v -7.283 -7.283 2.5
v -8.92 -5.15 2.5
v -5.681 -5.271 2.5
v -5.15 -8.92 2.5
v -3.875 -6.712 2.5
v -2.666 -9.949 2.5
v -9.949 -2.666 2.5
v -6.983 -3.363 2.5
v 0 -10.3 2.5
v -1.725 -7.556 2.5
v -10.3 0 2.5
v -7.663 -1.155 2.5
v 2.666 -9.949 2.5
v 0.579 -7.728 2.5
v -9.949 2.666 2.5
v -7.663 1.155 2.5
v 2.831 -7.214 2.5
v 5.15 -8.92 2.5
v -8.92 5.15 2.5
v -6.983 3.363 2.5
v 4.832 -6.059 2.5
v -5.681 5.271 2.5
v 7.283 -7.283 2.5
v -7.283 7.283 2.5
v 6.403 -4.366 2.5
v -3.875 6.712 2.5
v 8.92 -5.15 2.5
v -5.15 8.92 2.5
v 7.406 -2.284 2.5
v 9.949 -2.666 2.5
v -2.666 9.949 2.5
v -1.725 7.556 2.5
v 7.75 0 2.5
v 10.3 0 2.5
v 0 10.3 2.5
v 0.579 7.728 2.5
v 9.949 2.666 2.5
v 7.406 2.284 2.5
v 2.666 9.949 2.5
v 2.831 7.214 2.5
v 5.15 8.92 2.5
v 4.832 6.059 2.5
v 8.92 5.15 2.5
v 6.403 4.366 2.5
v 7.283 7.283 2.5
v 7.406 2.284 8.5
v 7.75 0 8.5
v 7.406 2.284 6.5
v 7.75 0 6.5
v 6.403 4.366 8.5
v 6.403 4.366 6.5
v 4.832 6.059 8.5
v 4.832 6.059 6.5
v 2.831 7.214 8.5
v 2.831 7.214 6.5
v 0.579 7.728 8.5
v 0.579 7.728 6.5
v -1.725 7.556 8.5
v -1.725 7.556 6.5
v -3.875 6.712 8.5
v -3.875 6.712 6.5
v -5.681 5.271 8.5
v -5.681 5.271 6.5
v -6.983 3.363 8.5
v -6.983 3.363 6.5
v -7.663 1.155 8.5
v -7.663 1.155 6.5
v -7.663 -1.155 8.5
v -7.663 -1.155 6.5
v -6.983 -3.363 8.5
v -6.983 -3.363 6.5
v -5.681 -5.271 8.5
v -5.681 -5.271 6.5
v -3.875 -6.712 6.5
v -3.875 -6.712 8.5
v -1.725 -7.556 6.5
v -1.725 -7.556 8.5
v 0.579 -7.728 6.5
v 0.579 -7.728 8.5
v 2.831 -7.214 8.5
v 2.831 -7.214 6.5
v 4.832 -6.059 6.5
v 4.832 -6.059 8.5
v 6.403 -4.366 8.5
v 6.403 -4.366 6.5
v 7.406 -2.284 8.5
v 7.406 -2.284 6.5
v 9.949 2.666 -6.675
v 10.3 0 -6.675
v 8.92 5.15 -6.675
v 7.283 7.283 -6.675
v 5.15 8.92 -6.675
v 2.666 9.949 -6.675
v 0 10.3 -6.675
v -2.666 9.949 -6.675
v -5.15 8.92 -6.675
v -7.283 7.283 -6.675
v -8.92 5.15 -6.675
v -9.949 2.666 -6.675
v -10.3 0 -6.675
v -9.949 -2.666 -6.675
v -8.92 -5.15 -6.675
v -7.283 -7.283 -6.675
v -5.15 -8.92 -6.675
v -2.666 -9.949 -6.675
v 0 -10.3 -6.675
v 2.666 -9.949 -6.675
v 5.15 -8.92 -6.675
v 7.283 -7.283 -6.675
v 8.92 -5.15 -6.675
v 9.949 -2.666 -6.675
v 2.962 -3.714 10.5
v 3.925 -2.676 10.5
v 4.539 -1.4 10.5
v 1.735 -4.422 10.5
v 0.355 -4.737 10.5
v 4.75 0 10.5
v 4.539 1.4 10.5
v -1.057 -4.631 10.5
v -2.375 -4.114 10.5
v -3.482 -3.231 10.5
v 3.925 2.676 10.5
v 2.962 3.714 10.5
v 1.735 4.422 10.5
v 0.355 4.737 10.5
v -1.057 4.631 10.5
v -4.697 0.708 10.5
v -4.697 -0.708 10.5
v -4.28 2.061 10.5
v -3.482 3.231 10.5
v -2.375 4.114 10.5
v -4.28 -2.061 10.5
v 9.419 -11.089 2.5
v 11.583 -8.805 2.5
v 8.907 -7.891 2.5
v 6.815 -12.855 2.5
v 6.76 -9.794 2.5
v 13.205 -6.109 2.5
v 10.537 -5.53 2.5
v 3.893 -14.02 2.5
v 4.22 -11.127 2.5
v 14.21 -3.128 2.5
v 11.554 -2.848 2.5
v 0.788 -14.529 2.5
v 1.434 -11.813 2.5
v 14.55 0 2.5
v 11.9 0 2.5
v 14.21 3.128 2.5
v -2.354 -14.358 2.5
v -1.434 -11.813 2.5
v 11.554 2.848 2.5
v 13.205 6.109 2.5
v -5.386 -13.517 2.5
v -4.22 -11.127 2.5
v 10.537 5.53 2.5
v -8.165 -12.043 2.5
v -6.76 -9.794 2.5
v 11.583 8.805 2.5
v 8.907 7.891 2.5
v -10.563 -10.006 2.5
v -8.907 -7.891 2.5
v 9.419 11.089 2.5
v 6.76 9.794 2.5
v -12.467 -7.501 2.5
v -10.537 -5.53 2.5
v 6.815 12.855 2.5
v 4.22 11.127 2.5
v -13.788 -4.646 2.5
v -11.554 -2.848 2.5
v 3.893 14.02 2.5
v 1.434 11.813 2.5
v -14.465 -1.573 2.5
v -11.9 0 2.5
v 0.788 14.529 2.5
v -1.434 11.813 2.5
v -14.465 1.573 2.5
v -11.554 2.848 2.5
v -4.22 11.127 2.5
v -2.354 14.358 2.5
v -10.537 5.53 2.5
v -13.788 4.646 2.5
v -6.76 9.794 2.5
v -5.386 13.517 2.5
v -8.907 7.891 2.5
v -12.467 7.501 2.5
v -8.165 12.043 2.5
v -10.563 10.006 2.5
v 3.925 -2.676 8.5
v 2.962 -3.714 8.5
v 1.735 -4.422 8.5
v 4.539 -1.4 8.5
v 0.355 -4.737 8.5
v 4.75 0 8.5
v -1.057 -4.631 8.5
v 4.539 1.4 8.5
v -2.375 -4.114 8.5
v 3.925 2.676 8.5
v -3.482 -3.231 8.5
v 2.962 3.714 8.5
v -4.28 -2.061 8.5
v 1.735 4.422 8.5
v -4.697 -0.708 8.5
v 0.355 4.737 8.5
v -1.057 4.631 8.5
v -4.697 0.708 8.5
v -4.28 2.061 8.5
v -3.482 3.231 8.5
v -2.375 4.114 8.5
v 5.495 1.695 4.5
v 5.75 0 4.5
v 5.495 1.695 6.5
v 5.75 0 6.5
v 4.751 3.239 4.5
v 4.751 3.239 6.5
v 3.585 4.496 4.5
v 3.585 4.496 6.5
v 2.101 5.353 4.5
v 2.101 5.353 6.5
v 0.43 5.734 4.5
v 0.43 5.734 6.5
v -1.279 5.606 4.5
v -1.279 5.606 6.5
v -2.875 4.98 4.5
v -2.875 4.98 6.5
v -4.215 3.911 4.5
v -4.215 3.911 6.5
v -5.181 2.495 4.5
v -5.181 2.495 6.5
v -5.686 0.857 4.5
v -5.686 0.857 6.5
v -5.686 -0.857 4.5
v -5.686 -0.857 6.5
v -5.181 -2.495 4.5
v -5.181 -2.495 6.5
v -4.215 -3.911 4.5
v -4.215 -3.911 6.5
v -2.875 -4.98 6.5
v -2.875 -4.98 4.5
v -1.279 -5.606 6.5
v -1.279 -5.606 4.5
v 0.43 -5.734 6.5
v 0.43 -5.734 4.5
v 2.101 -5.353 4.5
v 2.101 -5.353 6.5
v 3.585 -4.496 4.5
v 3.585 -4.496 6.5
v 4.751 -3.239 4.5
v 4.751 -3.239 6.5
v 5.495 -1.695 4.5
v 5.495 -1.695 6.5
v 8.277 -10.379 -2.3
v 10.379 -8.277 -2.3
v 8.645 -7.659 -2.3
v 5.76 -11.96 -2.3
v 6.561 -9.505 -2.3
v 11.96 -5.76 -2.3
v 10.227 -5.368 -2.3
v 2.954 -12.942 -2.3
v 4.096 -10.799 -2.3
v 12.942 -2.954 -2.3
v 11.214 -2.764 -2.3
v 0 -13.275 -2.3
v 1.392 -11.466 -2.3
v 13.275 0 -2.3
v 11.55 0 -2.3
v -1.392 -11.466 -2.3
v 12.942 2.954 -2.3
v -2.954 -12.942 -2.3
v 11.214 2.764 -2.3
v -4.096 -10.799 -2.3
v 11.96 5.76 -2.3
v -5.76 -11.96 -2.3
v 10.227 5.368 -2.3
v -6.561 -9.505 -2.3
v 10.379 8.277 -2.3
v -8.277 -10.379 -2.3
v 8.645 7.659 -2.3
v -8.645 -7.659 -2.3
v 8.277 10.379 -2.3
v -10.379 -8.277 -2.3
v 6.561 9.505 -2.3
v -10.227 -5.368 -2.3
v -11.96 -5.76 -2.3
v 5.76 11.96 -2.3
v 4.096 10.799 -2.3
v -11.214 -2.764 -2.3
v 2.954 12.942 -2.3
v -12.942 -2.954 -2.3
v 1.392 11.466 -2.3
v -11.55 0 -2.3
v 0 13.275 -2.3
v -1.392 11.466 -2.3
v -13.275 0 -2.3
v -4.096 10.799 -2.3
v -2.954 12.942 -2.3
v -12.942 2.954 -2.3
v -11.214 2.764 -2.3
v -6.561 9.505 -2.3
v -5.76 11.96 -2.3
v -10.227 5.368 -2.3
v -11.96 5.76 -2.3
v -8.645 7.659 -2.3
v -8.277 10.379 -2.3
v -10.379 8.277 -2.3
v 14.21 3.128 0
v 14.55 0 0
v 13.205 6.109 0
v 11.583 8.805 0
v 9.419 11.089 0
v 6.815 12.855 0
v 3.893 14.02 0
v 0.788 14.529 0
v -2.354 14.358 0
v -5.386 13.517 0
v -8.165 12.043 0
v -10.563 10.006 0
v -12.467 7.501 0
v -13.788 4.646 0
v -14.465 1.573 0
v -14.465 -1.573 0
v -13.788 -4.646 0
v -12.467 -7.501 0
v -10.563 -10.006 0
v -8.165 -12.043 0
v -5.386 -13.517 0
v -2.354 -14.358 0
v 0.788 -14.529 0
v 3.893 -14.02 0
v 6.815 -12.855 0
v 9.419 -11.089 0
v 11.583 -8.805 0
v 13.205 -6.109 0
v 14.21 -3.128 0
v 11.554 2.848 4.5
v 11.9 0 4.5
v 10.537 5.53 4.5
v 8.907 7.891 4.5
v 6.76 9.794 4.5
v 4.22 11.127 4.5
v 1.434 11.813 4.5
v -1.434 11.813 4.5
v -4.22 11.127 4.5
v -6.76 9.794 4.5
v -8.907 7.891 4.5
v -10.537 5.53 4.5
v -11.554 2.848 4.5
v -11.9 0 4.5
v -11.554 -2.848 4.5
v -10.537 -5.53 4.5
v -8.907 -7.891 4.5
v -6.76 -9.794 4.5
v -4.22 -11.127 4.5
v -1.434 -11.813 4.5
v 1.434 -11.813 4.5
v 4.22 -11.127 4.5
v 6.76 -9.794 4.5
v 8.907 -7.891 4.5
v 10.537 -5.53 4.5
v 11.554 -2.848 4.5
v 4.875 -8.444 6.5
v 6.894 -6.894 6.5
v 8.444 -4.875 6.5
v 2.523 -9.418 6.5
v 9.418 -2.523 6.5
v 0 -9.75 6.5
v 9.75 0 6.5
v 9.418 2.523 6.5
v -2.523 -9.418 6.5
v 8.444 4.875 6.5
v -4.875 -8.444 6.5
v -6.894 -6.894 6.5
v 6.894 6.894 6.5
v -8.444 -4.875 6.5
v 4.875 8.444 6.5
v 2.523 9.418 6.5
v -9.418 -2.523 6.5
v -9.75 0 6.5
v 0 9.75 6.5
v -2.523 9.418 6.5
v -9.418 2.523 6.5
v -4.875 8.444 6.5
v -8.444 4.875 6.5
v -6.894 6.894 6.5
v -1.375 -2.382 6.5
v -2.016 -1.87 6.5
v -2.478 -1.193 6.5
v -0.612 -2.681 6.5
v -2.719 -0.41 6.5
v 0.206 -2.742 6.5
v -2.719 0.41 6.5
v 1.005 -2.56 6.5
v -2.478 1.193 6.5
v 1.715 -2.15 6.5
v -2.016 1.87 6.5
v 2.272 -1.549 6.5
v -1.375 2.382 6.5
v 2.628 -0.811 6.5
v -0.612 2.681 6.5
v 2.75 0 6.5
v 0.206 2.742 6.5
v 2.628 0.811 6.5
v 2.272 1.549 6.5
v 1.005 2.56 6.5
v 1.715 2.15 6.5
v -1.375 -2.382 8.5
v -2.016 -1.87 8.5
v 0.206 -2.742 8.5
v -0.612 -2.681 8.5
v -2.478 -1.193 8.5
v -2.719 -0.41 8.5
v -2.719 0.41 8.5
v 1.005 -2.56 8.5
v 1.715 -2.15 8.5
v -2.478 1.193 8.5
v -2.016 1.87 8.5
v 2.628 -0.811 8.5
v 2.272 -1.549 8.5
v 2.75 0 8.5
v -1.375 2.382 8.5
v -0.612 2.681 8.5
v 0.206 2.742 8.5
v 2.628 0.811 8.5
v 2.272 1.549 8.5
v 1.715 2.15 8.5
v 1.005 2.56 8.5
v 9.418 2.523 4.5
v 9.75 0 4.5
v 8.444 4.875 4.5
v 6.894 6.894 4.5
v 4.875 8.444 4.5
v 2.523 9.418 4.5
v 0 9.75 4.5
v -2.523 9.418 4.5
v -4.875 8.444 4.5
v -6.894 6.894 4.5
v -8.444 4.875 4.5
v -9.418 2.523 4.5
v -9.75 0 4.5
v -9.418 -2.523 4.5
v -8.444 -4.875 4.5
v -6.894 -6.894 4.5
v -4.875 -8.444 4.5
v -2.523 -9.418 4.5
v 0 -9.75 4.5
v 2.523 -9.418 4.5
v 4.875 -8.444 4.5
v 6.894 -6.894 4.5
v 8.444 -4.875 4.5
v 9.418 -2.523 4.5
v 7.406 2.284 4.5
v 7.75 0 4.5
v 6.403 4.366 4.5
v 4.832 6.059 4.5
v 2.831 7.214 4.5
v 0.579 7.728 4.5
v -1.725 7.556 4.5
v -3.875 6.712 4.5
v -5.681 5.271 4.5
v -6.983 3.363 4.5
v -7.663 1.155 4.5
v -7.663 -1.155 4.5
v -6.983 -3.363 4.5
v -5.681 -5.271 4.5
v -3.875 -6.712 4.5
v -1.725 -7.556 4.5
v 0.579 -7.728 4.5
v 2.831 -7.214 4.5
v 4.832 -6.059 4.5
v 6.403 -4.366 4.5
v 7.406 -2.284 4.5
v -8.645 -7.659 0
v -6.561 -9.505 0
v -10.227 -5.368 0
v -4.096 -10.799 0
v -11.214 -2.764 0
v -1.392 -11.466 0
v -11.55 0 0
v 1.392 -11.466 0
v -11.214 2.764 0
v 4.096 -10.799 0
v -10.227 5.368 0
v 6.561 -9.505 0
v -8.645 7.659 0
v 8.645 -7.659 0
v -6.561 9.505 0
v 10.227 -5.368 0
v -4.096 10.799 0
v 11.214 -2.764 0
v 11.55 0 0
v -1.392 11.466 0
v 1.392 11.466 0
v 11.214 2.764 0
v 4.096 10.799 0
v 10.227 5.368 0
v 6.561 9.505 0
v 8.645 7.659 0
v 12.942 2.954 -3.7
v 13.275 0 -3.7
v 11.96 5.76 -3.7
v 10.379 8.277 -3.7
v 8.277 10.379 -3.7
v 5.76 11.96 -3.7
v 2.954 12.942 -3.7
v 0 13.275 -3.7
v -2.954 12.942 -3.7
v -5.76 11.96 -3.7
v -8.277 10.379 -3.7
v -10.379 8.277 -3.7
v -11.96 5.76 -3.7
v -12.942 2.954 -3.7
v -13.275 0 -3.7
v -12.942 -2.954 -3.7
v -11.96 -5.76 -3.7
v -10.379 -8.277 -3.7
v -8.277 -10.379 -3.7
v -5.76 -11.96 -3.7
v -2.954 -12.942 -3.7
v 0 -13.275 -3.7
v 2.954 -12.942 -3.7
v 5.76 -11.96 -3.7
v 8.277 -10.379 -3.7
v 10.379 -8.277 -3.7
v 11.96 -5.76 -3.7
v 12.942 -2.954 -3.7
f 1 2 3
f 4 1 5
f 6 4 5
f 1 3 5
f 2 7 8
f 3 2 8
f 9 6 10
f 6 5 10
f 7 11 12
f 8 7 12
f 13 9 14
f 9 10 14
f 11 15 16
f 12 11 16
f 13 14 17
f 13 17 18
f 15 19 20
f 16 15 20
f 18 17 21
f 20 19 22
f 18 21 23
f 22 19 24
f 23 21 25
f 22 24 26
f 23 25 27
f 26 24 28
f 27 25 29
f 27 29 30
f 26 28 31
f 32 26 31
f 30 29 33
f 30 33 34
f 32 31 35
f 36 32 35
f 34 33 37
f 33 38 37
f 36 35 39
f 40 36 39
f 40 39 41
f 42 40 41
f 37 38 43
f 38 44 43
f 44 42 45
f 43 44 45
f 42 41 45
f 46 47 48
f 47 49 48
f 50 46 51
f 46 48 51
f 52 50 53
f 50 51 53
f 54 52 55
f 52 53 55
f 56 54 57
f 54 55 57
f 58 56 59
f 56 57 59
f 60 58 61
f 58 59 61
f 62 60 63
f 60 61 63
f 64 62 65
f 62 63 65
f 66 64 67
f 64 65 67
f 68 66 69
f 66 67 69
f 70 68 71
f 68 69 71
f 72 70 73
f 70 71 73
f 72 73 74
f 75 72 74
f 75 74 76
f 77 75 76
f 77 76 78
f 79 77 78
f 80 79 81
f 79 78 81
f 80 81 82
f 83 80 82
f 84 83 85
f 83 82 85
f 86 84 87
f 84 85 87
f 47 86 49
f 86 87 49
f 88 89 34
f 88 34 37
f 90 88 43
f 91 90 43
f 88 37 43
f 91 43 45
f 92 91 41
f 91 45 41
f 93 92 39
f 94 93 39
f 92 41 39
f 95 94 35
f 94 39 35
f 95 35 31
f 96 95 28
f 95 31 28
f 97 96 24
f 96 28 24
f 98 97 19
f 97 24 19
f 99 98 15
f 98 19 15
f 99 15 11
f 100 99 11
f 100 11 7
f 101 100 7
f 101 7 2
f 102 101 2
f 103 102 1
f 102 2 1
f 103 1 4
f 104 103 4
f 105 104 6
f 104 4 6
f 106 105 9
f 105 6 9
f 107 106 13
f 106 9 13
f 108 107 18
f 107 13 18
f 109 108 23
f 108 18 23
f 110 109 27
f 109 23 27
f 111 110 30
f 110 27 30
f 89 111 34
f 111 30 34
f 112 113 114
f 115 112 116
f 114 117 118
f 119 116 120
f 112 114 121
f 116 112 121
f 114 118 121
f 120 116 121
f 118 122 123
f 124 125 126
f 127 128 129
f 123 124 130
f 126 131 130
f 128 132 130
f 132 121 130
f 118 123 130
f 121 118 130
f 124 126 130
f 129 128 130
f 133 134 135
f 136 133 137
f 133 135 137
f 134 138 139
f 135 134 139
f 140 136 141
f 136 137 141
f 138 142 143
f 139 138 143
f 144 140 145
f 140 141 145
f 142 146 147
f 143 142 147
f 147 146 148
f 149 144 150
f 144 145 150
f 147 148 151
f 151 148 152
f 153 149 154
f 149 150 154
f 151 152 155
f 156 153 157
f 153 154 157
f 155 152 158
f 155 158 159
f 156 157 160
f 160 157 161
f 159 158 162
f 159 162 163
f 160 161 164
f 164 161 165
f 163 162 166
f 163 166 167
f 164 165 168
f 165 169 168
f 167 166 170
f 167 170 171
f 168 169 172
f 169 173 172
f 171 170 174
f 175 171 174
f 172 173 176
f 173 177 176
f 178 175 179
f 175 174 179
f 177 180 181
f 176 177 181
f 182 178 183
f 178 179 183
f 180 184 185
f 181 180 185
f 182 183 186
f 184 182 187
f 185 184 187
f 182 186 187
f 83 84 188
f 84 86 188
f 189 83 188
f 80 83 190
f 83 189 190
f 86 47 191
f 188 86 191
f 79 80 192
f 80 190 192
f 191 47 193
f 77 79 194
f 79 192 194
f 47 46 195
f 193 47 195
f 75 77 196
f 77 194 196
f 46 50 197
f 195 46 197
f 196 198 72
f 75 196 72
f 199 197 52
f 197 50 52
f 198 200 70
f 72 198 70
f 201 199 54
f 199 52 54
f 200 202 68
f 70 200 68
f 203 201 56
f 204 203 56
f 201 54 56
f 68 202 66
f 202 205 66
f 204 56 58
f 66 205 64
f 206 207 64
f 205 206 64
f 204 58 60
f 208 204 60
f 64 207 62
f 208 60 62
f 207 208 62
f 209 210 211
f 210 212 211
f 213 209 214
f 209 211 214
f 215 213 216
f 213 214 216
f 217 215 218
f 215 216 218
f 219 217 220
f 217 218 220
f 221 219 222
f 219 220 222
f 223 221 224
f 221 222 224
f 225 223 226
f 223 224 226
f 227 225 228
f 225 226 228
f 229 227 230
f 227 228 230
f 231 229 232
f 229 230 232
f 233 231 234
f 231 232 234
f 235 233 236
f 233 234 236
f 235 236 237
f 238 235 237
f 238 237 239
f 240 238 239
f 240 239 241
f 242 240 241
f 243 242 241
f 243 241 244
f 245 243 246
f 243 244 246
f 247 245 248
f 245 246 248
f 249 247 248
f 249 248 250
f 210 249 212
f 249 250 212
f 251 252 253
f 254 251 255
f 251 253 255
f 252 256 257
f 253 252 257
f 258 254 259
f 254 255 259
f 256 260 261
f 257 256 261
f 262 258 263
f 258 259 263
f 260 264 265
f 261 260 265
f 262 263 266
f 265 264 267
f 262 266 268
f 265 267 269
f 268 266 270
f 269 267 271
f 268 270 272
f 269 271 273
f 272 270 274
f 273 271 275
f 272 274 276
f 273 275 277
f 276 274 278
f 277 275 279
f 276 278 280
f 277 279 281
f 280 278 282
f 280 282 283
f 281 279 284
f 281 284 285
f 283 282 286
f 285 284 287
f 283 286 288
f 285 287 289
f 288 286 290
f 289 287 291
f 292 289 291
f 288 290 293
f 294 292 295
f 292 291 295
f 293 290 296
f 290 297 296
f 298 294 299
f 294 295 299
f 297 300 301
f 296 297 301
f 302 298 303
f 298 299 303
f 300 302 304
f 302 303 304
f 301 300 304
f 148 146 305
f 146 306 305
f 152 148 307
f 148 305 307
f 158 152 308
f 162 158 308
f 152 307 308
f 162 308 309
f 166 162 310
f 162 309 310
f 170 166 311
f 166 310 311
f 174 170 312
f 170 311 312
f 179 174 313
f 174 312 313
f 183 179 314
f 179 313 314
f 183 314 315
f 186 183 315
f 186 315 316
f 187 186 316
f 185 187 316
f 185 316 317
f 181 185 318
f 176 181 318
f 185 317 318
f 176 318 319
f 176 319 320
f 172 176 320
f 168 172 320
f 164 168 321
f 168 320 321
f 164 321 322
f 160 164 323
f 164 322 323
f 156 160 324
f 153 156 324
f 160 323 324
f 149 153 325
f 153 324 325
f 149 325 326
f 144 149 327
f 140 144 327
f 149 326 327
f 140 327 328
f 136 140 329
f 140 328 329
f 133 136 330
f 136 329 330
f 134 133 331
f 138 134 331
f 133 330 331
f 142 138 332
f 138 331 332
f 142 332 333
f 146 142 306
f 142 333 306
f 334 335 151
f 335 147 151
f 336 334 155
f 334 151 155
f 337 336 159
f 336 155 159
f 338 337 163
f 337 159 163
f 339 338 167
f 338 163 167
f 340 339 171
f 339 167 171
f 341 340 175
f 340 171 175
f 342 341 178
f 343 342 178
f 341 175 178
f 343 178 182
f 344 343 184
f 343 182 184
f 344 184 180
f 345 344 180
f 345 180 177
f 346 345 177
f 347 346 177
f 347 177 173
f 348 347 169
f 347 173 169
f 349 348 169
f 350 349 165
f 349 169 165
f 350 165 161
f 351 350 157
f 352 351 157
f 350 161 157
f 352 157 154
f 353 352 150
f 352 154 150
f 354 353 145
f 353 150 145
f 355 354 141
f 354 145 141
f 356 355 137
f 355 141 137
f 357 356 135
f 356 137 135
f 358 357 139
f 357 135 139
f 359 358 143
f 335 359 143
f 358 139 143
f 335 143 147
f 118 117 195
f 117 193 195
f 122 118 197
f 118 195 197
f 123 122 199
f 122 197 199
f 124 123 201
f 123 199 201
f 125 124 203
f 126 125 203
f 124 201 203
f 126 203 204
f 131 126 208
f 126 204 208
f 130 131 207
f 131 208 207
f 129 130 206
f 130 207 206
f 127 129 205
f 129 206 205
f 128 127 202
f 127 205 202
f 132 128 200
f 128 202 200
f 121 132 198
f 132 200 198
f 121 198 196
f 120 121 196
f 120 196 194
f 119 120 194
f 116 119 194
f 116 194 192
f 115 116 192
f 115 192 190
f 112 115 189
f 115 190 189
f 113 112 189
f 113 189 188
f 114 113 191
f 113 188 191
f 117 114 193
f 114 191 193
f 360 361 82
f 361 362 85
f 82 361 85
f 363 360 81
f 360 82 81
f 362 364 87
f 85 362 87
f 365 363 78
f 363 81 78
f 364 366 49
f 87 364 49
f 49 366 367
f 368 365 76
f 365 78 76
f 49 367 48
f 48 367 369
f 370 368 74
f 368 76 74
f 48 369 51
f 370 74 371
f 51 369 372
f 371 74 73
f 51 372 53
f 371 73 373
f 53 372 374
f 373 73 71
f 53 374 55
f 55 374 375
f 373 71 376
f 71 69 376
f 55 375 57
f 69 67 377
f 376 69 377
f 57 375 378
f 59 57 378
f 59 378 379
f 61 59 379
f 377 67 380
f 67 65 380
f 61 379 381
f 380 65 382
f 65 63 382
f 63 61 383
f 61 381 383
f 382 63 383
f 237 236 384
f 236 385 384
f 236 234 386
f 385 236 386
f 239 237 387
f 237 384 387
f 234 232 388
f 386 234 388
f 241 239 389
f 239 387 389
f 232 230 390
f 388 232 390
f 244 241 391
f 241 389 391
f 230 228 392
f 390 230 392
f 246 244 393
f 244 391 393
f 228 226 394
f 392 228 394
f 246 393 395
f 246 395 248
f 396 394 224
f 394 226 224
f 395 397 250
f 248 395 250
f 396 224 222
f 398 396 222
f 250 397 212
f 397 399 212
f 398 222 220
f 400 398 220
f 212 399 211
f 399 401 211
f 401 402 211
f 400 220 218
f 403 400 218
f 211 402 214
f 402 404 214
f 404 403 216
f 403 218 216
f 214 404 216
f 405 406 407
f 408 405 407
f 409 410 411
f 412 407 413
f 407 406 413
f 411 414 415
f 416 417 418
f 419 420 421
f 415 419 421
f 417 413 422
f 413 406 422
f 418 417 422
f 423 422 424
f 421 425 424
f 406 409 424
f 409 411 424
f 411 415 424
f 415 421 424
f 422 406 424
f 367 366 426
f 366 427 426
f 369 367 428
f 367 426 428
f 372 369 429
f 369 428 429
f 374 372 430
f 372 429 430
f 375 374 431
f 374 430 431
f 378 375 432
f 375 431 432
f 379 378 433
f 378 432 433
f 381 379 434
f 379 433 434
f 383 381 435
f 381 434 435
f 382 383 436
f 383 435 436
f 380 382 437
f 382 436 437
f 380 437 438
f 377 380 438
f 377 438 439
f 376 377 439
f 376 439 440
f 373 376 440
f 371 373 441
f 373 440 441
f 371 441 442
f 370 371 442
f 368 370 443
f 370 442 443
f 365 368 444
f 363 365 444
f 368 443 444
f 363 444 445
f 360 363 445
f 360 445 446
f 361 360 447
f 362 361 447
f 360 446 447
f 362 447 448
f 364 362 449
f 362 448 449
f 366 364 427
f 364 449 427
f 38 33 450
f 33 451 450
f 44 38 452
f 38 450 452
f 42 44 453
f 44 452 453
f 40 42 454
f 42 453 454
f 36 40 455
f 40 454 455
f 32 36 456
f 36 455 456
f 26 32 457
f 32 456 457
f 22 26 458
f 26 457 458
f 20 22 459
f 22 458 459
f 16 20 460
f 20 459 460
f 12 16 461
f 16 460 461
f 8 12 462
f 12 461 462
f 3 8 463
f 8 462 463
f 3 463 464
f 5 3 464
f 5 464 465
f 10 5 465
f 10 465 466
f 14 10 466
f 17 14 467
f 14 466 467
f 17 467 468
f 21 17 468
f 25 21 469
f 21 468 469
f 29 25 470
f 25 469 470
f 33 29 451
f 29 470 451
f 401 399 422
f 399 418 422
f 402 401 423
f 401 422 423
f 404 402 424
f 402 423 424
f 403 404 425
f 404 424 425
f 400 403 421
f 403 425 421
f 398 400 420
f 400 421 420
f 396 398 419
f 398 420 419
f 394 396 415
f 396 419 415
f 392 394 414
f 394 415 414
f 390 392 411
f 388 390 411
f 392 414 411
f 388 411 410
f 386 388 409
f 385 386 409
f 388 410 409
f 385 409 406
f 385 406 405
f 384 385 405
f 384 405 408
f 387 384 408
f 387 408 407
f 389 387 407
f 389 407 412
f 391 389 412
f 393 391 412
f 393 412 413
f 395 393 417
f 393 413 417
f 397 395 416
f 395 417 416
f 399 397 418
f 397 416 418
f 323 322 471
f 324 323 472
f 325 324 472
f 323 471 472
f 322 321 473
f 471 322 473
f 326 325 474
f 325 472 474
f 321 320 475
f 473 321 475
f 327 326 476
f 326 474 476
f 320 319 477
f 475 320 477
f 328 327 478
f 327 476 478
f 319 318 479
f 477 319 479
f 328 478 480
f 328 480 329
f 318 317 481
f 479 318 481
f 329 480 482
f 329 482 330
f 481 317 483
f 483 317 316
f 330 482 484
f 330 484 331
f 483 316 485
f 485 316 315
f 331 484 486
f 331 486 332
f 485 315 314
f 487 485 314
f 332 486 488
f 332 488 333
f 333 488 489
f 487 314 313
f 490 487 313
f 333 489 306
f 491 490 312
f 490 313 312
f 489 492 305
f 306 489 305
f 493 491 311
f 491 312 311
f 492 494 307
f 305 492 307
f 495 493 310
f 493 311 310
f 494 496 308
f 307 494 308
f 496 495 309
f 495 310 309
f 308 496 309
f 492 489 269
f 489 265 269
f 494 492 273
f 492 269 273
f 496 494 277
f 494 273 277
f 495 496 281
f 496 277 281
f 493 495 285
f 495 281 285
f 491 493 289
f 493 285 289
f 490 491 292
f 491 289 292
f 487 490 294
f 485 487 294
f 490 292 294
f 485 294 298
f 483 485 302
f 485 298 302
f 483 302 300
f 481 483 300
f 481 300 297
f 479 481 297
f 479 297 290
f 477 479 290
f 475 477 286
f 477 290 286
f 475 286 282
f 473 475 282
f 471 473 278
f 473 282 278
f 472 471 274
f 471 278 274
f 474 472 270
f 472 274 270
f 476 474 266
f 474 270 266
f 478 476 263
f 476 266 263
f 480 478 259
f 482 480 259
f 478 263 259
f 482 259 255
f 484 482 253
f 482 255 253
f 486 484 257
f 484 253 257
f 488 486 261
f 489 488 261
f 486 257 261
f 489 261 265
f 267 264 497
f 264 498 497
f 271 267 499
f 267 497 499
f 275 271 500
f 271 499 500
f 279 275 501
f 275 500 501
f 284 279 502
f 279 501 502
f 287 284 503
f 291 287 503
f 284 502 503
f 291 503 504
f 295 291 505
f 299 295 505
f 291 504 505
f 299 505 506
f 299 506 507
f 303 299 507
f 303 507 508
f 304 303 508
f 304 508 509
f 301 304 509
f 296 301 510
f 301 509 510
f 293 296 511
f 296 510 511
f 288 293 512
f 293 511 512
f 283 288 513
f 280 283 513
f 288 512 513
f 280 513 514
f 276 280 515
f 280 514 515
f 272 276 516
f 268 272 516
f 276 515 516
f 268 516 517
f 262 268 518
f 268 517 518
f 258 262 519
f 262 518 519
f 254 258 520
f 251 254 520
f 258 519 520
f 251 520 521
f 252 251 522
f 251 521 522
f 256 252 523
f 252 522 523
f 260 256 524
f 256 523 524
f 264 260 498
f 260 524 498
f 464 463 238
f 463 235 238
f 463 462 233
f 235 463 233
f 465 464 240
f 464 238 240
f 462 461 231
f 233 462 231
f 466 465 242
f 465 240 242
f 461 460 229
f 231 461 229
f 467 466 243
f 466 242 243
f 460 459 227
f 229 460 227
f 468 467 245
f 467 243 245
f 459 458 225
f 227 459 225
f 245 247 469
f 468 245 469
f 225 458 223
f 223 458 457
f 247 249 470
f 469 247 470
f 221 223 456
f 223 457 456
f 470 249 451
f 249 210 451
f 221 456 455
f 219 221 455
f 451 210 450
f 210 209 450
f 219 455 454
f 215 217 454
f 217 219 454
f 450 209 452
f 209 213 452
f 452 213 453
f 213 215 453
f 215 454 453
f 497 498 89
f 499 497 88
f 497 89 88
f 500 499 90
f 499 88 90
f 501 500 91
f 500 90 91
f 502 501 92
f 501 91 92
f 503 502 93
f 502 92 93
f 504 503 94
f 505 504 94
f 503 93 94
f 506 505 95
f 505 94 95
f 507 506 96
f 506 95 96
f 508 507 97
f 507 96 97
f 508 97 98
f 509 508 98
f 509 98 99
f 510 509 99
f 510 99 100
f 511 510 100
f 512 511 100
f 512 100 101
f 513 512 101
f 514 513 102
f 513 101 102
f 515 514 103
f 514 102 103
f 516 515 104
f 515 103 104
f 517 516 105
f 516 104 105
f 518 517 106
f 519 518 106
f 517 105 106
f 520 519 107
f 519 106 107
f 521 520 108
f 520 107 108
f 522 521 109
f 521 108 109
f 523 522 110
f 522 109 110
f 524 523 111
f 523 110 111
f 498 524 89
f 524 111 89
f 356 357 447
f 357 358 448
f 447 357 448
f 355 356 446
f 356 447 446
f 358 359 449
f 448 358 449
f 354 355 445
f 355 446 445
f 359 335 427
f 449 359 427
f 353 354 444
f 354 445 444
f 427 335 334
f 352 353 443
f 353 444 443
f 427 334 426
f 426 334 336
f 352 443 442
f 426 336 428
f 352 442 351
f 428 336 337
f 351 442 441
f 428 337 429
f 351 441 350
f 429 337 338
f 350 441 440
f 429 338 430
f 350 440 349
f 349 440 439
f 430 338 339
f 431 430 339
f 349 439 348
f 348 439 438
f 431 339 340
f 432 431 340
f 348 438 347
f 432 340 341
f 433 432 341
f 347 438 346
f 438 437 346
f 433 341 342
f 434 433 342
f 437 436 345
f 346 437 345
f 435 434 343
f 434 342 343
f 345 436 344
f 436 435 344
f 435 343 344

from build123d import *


with BuildPart() as part:
    # Sketch → Revolution (revolve)
    with BuildSketch(Plane.XZ):
        Polygon((14.55, 0), (11.55, 0), (11.55, -2.3), (13.275, -2.3), (13.275, -3.7), (10.3, -6.675), (10.3, 2.5), (7.75, 2.5), (7.75, 4.5), (5.75, 4.5), (5.75, 6.5), (2.75, 6.5), (2.75, 8.5), (0, 8.5), (0, 10.5), (4.75, 10.5), (4.75, 8.5), (7.75, 8.5), (7.75, 6.5), (9.75, 6.5), (9.75, 4.5), (11.9, 4.5), (11.9, 2.5), (14.55, 2.5), align=None)
    revolve(axis=Axis((0, 0, 0), (0, 0, 1)))


solid = part.part
